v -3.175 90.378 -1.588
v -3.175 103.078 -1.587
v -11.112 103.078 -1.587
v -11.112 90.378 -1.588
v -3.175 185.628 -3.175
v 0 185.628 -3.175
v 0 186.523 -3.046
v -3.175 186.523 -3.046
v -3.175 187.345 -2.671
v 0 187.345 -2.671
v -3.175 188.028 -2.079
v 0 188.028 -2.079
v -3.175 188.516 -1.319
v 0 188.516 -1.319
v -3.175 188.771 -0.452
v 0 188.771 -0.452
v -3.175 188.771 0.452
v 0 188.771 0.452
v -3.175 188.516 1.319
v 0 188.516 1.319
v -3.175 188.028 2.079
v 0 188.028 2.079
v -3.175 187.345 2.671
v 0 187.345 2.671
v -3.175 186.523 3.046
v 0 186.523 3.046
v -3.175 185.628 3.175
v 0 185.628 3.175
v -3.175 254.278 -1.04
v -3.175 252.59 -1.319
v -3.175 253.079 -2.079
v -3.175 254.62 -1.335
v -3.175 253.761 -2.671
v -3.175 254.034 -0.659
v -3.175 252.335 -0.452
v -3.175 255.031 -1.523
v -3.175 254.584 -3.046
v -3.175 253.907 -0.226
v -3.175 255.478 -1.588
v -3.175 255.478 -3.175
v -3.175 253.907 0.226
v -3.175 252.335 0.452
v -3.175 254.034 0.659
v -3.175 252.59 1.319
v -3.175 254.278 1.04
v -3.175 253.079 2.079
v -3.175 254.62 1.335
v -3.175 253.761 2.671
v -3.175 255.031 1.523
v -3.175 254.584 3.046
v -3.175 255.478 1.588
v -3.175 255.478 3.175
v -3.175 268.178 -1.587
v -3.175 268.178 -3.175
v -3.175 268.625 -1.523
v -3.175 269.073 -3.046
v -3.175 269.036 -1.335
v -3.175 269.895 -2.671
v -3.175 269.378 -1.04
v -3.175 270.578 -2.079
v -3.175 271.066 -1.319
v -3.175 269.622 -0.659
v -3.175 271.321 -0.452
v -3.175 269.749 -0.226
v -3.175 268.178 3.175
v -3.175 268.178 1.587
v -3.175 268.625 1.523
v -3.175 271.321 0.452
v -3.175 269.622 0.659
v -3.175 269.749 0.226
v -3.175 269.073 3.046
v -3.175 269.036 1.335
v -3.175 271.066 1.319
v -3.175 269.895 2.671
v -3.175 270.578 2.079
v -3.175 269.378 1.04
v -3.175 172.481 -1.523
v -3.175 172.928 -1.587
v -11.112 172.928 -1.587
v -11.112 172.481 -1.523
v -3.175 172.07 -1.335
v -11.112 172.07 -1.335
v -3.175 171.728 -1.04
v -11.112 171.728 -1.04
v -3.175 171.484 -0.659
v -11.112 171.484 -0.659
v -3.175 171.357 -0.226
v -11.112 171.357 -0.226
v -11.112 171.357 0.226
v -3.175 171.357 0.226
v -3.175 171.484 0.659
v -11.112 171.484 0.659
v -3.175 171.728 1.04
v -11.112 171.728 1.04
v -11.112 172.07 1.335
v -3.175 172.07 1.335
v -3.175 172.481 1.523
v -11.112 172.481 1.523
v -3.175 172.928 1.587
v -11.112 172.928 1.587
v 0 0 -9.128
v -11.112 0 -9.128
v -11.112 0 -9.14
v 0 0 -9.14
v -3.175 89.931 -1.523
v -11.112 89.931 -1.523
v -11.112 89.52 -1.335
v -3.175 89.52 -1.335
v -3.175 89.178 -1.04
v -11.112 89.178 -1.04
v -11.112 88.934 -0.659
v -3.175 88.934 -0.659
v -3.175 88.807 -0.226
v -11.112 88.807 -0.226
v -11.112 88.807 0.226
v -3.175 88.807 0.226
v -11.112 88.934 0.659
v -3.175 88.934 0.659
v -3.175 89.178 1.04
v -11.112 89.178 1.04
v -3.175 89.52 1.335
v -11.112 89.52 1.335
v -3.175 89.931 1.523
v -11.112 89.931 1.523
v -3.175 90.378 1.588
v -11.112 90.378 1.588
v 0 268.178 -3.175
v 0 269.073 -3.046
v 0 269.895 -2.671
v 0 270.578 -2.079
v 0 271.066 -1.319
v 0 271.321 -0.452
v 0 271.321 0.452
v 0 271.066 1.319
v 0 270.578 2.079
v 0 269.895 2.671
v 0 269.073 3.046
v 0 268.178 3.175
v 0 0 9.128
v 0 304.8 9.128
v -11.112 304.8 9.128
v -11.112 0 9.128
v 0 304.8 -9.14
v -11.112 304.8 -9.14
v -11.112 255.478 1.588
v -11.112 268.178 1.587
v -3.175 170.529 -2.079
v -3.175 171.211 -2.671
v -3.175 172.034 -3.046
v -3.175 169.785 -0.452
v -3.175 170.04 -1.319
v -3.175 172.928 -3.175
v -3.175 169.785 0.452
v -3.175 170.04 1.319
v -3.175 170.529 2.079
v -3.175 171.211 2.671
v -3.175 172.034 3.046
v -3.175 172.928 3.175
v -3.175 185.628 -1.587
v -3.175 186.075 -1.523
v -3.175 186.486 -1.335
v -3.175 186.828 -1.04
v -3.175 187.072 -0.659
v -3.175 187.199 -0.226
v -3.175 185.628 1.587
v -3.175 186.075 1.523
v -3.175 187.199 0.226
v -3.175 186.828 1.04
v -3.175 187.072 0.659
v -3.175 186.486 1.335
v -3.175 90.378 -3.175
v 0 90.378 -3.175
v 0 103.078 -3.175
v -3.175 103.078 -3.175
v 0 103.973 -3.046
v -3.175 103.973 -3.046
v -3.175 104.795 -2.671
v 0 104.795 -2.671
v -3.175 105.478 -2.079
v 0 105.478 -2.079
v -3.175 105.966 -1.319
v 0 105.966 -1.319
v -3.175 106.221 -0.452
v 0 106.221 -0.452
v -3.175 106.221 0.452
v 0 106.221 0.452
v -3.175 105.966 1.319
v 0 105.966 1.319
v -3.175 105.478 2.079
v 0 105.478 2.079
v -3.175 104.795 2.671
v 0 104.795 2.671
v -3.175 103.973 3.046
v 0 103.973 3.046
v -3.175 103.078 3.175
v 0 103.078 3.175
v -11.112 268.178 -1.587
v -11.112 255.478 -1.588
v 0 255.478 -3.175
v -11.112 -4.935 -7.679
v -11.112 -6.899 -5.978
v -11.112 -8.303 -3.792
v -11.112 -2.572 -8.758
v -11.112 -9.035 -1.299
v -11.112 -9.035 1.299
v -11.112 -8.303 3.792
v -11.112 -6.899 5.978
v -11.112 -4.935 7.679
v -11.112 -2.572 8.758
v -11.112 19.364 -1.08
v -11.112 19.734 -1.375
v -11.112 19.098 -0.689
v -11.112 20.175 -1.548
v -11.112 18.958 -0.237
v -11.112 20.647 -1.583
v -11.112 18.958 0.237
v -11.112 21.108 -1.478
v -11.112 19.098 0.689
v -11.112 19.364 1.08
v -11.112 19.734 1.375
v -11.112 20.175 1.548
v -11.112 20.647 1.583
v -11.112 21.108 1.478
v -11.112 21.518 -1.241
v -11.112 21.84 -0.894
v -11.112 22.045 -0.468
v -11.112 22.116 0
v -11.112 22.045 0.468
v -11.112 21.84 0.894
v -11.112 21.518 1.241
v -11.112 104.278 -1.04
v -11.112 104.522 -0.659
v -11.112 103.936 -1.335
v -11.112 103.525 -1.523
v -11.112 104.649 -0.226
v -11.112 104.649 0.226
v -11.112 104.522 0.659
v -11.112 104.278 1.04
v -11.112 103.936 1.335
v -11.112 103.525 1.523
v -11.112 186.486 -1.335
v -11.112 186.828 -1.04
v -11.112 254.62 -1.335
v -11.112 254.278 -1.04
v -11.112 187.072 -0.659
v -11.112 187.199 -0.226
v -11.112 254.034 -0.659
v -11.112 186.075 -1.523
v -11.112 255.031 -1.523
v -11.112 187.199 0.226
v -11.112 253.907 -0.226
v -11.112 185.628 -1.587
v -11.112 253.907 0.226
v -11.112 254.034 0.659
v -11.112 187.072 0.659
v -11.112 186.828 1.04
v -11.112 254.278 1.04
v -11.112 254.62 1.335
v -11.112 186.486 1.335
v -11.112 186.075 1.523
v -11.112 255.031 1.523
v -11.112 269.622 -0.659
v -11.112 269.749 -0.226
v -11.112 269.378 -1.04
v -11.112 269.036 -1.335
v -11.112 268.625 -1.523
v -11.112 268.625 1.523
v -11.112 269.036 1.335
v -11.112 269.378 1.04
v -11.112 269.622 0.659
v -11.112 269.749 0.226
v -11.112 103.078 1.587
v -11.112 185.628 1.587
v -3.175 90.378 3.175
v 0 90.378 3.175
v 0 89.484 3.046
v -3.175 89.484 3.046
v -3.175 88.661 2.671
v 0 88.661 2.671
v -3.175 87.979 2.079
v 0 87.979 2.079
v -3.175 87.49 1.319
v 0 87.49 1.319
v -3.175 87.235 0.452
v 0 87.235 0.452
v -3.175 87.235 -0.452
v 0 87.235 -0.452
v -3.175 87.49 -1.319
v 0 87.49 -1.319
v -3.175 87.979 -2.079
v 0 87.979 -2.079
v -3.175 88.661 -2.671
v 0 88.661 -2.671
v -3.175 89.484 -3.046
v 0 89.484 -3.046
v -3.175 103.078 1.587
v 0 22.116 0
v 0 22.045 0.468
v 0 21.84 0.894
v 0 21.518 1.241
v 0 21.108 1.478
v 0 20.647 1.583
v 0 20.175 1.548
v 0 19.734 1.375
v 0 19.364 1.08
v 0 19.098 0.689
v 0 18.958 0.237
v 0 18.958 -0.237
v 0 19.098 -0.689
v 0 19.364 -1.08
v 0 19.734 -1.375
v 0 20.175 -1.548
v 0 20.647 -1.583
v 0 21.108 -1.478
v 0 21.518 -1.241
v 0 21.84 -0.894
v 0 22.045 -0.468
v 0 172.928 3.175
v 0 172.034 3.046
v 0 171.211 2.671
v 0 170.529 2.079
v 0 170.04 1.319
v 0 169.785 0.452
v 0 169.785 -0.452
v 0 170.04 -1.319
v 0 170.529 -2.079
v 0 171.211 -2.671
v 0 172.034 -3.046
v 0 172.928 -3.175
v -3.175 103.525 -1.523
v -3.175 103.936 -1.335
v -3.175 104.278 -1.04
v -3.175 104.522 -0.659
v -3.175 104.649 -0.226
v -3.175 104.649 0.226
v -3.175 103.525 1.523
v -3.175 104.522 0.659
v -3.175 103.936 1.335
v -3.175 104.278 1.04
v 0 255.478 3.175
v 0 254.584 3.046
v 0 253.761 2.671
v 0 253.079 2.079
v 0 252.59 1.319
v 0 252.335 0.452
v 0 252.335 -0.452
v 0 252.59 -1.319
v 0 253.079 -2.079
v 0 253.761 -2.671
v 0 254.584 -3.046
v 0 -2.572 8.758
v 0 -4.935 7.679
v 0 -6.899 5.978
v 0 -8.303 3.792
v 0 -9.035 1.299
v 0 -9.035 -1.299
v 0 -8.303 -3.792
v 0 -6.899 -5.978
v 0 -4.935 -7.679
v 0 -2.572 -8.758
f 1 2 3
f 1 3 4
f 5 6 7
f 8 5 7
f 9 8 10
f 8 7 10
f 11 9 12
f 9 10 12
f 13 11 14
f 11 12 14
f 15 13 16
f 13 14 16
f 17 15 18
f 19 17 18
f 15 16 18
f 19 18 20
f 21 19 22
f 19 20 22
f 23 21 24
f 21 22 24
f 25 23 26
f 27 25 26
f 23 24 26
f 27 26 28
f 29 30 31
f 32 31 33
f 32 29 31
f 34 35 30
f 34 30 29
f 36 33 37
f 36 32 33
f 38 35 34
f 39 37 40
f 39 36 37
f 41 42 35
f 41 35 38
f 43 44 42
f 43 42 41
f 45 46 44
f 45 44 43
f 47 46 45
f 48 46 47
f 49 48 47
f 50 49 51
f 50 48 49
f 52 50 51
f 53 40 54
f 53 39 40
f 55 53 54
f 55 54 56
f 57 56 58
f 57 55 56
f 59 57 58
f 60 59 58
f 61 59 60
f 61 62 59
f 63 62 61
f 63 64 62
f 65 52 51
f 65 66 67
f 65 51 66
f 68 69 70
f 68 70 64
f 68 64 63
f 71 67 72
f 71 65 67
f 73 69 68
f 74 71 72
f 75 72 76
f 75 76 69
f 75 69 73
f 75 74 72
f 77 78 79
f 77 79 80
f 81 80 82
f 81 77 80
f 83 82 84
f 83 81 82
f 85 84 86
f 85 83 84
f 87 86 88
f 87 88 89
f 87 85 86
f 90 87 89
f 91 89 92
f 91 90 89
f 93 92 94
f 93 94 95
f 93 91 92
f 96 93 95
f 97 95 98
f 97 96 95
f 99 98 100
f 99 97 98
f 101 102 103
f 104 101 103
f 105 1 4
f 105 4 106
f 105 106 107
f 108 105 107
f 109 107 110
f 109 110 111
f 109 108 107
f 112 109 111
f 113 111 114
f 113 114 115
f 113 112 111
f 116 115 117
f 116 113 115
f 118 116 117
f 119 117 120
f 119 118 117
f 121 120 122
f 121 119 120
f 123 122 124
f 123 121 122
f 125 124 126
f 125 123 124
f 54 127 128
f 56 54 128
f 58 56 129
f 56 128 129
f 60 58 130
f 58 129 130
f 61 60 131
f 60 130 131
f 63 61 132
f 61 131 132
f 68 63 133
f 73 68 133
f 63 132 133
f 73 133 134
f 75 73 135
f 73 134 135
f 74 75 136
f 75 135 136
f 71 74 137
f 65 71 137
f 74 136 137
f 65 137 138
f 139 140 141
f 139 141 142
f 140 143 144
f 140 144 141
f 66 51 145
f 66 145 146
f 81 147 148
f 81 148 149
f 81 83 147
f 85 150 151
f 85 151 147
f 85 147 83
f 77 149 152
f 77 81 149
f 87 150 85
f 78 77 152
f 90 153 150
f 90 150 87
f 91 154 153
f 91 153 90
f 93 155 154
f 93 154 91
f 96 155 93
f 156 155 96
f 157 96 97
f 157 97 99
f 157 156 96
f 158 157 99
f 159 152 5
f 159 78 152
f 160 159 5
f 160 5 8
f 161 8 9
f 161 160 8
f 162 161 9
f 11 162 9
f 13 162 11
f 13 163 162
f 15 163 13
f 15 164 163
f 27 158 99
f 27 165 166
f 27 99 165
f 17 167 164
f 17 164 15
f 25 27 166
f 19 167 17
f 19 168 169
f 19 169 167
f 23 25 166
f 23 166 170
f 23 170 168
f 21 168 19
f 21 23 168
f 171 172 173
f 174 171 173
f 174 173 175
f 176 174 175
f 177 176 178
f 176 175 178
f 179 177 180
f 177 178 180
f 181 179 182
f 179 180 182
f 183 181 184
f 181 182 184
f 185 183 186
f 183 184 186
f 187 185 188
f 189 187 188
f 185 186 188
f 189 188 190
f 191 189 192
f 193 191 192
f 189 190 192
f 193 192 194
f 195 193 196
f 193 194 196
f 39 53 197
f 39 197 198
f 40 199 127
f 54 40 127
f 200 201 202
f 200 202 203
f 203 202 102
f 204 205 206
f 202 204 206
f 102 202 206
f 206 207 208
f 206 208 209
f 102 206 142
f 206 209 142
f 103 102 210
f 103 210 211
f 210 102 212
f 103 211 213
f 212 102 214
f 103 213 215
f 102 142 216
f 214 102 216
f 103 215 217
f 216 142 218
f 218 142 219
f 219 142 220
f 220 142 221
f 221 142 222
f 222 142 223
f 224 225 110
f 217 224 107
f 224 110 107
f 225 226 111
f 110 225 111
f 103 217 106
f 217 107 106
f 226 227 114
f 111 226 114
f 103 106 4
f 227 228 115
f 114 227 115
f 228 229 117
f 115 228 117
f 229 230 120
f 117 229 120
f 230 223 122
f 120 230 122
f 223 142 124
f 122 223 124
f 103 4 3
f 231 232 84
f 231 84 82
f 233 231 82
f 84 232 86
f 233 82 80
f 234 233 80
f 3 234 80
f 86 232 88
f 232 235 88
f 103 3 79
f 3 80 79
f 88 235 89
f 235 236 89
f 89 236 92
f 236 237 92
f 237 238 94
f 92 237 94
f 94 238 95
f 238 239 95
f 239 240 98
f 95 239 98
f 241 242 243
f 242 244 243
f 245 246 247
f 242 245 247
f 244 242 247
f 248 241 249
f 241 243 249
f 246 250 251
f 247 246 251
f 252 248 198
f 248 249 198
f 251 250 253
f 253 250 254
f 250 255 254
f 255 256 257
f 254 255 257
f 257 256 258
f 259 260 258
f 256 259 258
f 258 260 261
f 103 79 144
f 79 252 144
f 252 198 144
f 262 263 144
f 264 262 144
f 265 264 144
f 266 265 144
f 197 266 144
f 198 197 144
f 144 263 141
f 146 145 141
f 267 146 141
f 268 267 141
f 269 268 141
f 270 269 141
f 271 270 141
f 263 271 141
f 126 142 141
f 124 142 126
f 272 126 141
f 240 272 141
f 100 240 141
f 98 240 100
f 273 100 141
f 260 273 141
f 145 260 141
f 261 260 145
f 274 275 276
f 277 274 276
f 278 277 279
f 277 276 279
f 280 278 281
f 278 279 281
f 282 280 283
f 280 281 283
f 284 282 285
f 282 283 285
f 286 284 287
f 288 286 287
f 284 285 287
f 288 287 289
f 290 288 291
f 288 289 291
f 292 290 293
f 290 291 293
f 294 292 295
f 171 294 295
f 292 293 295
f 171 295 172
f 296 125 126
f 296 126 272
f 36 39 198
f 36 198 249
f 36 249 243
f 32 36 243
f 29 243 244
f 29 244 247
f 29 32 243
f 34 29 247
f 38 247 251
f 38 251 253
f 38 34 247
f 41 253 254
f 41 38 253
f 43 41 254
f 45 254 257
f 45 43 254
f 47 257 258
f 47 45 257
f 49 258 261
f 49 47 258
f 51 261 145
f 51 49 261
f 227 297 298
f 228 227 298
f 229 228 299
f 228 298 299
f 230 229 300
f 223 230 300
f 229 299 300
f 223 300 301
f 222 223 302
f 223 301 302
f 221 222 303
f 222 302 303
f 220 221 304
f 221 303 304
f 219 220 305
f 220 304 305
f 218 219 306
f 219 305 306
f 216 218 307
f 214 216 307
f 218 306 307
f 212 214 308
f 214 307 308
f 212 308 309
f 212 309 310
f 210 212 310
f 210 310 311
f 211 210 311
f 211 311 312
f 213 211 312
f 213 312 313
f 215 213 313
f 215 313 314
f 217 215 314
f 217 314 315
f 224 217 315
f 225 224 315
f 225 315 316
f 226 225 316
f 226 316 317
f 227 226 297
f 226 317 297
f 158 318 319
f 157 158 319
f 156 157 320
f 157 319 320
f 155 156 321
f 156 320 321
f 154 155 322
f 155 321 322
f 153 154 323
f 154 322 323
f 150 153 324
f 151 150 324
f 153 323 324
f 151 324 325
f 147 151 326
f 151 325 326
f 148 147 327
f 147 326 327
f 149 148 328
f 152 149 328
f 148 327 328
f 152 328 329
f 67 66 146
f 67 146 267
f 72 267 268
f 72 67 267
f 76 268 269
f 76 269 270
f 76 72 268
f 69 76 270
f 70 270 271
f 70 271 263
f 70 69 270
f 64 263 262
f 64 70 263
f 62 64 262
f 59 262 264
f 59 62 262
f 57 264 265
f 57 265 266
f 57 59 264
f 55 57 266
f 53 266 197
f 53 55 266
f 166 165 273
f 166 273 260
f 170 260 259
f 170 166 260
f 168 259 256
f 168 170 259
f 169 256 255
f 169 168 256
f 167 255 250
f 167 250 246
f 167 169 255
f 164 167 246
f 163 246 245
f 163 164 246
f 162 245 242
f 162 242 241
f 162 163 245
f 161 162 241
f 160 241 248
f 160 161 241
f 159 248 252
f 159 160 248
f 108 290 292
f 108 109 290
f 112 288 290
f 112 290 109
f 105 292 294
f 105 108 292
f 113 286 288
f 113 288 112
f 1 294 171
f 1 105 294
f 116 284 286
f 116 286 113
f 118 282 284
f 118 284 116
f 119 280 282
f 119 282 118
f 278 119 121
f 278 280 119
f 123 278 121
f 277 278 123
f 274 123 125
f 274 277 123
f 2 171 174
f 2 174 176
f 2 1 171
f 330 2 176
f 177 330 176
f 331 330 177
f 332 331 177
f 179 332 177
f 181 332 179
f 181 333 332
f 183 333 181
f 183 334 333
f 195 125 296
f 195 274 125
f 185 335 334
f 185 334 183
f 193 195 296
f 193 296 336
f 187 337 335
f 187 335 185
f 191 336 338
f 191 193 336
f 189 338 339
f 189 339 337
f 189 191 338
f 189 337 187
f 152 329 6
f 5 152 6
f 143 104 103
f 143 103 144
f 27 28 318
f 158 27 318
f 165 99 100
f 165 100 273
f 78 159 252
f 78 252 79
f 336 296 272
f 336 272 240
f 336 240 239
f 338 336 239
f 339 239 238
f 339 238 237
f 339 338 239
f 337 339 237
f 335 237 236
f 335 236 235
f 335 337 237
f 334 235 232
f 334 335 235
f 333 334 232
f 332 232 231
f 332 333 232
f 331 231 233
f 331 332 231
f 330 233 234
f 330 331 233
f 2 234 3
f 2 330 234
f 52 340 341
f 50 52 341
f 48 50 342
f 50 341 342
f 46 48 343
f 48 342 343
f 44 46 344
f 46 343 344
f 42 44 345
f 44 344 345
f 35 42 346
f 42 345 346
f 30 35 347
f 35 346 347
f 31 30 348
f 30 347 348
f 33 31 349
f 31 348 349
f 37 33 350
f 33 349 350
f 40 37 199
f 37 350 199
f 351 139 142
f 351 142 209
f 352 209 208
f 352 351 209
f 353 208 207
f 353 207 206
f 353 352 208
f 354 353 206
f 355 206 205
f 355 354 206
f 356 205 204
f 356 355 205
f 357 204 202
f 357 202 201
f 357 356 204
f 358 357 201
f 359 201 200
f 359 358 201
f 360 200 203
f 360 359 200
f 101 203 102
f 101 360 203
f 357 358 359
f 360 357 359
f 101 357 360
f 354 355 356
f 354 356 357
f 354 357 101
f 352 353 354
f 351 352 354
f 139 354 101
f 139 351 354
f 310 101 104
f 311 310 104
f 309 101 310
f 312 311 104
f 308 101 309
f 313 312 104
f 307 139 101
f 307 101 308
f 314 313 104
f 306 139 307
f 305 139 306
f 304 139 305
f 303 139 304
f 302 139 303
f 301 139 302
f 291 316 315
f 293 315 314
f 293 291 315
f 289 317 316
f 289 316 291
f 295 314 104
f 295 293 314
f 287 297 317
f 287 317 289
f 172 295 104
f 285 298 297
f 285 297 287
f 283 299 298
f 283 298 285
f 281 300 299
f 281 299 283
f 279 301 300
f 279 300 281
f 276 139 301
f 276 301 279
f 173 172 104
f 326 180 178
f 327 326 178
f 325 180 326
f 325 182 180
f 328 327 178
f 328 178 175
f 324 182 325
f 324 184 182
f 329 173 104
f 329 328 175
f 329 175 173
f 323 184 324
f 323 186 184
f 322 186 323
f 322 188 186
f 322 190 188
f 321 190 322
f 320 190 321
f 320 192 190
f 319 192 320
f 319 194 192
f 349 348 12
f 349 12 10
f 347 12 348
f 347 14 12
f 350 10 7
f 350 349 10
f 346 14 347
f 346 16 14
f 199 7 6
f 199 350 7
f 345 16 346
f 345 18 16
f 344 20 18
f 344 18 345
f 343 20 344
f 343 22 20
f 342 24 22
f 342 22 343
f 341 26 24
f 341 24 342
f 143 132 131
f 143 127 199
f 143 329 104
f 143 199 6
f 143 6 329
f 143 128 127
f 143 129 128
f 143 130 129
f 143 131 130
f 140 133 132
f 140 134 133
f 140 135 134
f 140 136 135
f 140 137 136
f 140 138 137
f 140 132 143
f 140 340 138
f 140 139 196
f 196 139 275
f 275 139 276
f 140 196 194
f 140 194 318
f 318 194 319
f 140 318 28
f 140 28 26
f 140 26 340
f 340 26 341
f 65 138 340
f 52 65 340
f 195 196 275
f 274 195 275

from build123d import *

# Parameters (mm, degrees)
F0_R     = 1.5875
F1_DEPTH = 11.1125
F2_DEPTH = 3.175


with BuildPart() as f1:
    # F0 (on Right) → F1 (new body)
    with BuildSketch(Plane.YZ):
        with BuildLine():
            Line((304.8, 9.128125), (0, 9.128125))
            ThreePointArc((0, 9.128125), (-9.128125, 0), (0, -9.128125))
            Line((0, -9.128125), (0, -9.140291))
            Line((0, -9.140291), (304.8, -9.140291))
            Line((304.8, -9.140291), (304.8, 9.128125))
        make_face()
        with Locations((20.528005, 0)):
            Circle(F0_R, mode=Mode.SUBTRACT)
        with BuildLine():
            Line((103.078005, -3.175), (90.378005, -3.175))
            ThreePointArc((90.378005, -3.175), (87.203005, 0), (90.378005, 3.175))
            Line((90.378005, 3.175), (103.078005, 3.175))
            ThreePointArc((103.078005, 3.175), (106.253005, 0), (103.078005, -3.175))
        make_face(mode=Mode.SUBTRACT)
        with BuildLine():
            Line((185.628005, -3.175), (172.928005, -3.175))
            ThreePointArc((172.928005, -3.175), (169.753005, 0), (172.928005, 3.175))
            Line((172.928005, 3.175), (185.628005, 3.175))
            ThreePointArc((185.628005, 3.175), (188.803005, 0), (185.628005, -3.175))
        make_face(mode=Mode.SUBTRACT)
        with BuildLine():
            Line((268.178005, -3.175), (255.478005, -3.175))
            ThreePointArc((255.478005, -3.175), (252.303005, 0), (255.478005, 3.175))
            Line((255.478005, 3.175), (268.178005, 3.175))
            ThreePointArc((268.178005, 3.175), (271.353005, 0), (268.178005, -3.175))
        make_face(mode=Mode.SUBTRACT)
        with BuildLine():
            ThreePointArc((90.378005, 3.175), (87.203005, 0), (90.378005, -3.175))
            Line((90.378005, -3.175), (103.078005, -3.175))
            ThreePointArc((103.078005, -3.175), (106.253005, 0), (103.078005, 3.175))
            Line((103.078005, 3.175), (90.378005, 3.175))
        make_face()
        with BuildLine():
            Line((103.078005, -1.5875), (90.378005, -1.5875))
            ThreePointArc((90.378005, -1.5875), (88.790505, 0), (90.378005, 1.5875))
            Line((90.378005, 1.5875), (103.078005, 1.5875))
            ThreePointArc((103.078005, 1.5875), (104.665505, 0), (103.078005, -1.5875))
        make_face(mode=Mode.SUBTRACT)
        with BuildLine():
            ThreePointArc((255.478005, 3.175), (252.303005, 0), (255.478005, -3.175))
            Line((255.478005, -3.175), (268.178005, -3.175))
            ThreePointArc((268.178005, -3.175), (271.353005, 0), (268.178005, 3.175))
            Line((268.178005, 3.175), (255.478005, 3.175))
        make_face()
        with BuildLine():
            Line((268.178005, -1.5875), (255.478005, -1.5875))
            ThreePointArc((255.478005, -1.5875), (253.890505, 0), (255.478005, 1.5875))
            Line((255.478005, 1.5875), (268.178005, 1.5875))
            ThreePointArc((268.178005, 1.5875), (269.765505, 0), (268.178005, -1.5875))
        make_face(mode=Mode.SUBTRACT)
        with BuildLine():
            ThreePointArc((172.928005, 3.175), (169.753005, 0), (172.928005, -3.175))
            Line((172.928005, -3.175), (185.628005, -3.175))
            ThreePointArc((185.628005, -3.175), (188.803005, 0), (185.628005, 3.175))
            Line((185.628005, 3.175), (172.928005, 3.175))
        make_face()
        with BuildLine():
            Line((185.628005, -1.5875), (172.928005, -1.5875))
            ThreePointArc((172.928005, -1.5875), (171.340505, 0), (172.928005, 1.5875))
            Line((172.928005, 1.5875), (185.628005, 1.5875))
            ThreePointArc((185.628005, 1.5875), (187.215505, 0), (185.628005, -1.5875))
        make_face(mode=Mode.SUBTRACT)
    extrude(amount=-F1_DEPTH)

    # F0 (on Right) → F2 (cut)
    with BuildSketch(Plane.YZ):
        with BuildLine():
            ThreePointArc((90.378005, 3.175), (87.203005, 0), (90.378005, -3.175))
            Line((90.378005, -3.175), (103.078005, -3.175))
            ThreePointArc((103.078005, -3.175), (106.253005, 0), (103.078005, 3.175))
            Line((103.078005, 3.175), (90.378005, 3.175))
        make_face()
        with BuildLine():
            Line((103.078005, -1.5875), (90.378005, -1.5875))
            ThreePointArc((90.378005, -1.5875), (88.790505, 0), (90.378005, 1.5875))
            Line((90.378005, 1.5875), (103.078005, 1.5875))
            ThreePointArc((103.078005, 1.5875), (104.665505, 0), (103.078005, -1.5875))
        make_face(mode=Mode.SUBTRACT)
        with BuildLine():
            ThreePointArc((172.928005, 3.175), (169.753005, 0), (172.928005, -3.175))
            Line((172.928005, -3.175), (185.628005, -3.175))
            ThreePointArc((185.628005, -3.175), (188.803005, 0), (185.628005, 3.175))
            Line((185.628005, 3.175), (172.928005, 3.175))
        make_face()
        with BuildLine():
            Line((185.628005, -1.5875), (172.928005, -1.5875))
            ThreePointArc((172.928005, -1.5875), (171.340505, 0), (172.928005, 1.5875))
            Line((172.928005, 1.5875), (185.628005, 1.5875))
            ThreePointArc((185.628005, 1.5875), (187.215505, 0), (185.628005, -1.5875))
        make_face(mode=Mode.SUBTRACT)
        with BuildLine():
            ThreePointArc((255.478005, 3.175), (252.303005, 0), (255.478005, -3.175))
            Line((255.478005, -3.175), (268.178005, -3.175))
            ThreePointArc((268.178005, -3.175), (271.353005, 0), (268.178005, 3.175))
            Line((268.178005, 3.175), (255.478005, 3.175))
        make_face()
        with BuildLine():
            Line((268.178005, -1.5875), (255.478005, -1.5875))
            ThreePointArc((255.478005, -1.5875), (253.890505, 0), (255.478005, 1.5875))
            Line((255.478005, 1.5875), (268.178005, 1.5875))
            ThreePointArc((268.178005, 1.5875), (269.765505, 0), (268.178005, -1.5875))
        make_face(mode=Mode.SUBTRACT)
    extrude(amount=-F2_DEPTH, mode=Mode.SUBTRACT)


solid = f1.part
